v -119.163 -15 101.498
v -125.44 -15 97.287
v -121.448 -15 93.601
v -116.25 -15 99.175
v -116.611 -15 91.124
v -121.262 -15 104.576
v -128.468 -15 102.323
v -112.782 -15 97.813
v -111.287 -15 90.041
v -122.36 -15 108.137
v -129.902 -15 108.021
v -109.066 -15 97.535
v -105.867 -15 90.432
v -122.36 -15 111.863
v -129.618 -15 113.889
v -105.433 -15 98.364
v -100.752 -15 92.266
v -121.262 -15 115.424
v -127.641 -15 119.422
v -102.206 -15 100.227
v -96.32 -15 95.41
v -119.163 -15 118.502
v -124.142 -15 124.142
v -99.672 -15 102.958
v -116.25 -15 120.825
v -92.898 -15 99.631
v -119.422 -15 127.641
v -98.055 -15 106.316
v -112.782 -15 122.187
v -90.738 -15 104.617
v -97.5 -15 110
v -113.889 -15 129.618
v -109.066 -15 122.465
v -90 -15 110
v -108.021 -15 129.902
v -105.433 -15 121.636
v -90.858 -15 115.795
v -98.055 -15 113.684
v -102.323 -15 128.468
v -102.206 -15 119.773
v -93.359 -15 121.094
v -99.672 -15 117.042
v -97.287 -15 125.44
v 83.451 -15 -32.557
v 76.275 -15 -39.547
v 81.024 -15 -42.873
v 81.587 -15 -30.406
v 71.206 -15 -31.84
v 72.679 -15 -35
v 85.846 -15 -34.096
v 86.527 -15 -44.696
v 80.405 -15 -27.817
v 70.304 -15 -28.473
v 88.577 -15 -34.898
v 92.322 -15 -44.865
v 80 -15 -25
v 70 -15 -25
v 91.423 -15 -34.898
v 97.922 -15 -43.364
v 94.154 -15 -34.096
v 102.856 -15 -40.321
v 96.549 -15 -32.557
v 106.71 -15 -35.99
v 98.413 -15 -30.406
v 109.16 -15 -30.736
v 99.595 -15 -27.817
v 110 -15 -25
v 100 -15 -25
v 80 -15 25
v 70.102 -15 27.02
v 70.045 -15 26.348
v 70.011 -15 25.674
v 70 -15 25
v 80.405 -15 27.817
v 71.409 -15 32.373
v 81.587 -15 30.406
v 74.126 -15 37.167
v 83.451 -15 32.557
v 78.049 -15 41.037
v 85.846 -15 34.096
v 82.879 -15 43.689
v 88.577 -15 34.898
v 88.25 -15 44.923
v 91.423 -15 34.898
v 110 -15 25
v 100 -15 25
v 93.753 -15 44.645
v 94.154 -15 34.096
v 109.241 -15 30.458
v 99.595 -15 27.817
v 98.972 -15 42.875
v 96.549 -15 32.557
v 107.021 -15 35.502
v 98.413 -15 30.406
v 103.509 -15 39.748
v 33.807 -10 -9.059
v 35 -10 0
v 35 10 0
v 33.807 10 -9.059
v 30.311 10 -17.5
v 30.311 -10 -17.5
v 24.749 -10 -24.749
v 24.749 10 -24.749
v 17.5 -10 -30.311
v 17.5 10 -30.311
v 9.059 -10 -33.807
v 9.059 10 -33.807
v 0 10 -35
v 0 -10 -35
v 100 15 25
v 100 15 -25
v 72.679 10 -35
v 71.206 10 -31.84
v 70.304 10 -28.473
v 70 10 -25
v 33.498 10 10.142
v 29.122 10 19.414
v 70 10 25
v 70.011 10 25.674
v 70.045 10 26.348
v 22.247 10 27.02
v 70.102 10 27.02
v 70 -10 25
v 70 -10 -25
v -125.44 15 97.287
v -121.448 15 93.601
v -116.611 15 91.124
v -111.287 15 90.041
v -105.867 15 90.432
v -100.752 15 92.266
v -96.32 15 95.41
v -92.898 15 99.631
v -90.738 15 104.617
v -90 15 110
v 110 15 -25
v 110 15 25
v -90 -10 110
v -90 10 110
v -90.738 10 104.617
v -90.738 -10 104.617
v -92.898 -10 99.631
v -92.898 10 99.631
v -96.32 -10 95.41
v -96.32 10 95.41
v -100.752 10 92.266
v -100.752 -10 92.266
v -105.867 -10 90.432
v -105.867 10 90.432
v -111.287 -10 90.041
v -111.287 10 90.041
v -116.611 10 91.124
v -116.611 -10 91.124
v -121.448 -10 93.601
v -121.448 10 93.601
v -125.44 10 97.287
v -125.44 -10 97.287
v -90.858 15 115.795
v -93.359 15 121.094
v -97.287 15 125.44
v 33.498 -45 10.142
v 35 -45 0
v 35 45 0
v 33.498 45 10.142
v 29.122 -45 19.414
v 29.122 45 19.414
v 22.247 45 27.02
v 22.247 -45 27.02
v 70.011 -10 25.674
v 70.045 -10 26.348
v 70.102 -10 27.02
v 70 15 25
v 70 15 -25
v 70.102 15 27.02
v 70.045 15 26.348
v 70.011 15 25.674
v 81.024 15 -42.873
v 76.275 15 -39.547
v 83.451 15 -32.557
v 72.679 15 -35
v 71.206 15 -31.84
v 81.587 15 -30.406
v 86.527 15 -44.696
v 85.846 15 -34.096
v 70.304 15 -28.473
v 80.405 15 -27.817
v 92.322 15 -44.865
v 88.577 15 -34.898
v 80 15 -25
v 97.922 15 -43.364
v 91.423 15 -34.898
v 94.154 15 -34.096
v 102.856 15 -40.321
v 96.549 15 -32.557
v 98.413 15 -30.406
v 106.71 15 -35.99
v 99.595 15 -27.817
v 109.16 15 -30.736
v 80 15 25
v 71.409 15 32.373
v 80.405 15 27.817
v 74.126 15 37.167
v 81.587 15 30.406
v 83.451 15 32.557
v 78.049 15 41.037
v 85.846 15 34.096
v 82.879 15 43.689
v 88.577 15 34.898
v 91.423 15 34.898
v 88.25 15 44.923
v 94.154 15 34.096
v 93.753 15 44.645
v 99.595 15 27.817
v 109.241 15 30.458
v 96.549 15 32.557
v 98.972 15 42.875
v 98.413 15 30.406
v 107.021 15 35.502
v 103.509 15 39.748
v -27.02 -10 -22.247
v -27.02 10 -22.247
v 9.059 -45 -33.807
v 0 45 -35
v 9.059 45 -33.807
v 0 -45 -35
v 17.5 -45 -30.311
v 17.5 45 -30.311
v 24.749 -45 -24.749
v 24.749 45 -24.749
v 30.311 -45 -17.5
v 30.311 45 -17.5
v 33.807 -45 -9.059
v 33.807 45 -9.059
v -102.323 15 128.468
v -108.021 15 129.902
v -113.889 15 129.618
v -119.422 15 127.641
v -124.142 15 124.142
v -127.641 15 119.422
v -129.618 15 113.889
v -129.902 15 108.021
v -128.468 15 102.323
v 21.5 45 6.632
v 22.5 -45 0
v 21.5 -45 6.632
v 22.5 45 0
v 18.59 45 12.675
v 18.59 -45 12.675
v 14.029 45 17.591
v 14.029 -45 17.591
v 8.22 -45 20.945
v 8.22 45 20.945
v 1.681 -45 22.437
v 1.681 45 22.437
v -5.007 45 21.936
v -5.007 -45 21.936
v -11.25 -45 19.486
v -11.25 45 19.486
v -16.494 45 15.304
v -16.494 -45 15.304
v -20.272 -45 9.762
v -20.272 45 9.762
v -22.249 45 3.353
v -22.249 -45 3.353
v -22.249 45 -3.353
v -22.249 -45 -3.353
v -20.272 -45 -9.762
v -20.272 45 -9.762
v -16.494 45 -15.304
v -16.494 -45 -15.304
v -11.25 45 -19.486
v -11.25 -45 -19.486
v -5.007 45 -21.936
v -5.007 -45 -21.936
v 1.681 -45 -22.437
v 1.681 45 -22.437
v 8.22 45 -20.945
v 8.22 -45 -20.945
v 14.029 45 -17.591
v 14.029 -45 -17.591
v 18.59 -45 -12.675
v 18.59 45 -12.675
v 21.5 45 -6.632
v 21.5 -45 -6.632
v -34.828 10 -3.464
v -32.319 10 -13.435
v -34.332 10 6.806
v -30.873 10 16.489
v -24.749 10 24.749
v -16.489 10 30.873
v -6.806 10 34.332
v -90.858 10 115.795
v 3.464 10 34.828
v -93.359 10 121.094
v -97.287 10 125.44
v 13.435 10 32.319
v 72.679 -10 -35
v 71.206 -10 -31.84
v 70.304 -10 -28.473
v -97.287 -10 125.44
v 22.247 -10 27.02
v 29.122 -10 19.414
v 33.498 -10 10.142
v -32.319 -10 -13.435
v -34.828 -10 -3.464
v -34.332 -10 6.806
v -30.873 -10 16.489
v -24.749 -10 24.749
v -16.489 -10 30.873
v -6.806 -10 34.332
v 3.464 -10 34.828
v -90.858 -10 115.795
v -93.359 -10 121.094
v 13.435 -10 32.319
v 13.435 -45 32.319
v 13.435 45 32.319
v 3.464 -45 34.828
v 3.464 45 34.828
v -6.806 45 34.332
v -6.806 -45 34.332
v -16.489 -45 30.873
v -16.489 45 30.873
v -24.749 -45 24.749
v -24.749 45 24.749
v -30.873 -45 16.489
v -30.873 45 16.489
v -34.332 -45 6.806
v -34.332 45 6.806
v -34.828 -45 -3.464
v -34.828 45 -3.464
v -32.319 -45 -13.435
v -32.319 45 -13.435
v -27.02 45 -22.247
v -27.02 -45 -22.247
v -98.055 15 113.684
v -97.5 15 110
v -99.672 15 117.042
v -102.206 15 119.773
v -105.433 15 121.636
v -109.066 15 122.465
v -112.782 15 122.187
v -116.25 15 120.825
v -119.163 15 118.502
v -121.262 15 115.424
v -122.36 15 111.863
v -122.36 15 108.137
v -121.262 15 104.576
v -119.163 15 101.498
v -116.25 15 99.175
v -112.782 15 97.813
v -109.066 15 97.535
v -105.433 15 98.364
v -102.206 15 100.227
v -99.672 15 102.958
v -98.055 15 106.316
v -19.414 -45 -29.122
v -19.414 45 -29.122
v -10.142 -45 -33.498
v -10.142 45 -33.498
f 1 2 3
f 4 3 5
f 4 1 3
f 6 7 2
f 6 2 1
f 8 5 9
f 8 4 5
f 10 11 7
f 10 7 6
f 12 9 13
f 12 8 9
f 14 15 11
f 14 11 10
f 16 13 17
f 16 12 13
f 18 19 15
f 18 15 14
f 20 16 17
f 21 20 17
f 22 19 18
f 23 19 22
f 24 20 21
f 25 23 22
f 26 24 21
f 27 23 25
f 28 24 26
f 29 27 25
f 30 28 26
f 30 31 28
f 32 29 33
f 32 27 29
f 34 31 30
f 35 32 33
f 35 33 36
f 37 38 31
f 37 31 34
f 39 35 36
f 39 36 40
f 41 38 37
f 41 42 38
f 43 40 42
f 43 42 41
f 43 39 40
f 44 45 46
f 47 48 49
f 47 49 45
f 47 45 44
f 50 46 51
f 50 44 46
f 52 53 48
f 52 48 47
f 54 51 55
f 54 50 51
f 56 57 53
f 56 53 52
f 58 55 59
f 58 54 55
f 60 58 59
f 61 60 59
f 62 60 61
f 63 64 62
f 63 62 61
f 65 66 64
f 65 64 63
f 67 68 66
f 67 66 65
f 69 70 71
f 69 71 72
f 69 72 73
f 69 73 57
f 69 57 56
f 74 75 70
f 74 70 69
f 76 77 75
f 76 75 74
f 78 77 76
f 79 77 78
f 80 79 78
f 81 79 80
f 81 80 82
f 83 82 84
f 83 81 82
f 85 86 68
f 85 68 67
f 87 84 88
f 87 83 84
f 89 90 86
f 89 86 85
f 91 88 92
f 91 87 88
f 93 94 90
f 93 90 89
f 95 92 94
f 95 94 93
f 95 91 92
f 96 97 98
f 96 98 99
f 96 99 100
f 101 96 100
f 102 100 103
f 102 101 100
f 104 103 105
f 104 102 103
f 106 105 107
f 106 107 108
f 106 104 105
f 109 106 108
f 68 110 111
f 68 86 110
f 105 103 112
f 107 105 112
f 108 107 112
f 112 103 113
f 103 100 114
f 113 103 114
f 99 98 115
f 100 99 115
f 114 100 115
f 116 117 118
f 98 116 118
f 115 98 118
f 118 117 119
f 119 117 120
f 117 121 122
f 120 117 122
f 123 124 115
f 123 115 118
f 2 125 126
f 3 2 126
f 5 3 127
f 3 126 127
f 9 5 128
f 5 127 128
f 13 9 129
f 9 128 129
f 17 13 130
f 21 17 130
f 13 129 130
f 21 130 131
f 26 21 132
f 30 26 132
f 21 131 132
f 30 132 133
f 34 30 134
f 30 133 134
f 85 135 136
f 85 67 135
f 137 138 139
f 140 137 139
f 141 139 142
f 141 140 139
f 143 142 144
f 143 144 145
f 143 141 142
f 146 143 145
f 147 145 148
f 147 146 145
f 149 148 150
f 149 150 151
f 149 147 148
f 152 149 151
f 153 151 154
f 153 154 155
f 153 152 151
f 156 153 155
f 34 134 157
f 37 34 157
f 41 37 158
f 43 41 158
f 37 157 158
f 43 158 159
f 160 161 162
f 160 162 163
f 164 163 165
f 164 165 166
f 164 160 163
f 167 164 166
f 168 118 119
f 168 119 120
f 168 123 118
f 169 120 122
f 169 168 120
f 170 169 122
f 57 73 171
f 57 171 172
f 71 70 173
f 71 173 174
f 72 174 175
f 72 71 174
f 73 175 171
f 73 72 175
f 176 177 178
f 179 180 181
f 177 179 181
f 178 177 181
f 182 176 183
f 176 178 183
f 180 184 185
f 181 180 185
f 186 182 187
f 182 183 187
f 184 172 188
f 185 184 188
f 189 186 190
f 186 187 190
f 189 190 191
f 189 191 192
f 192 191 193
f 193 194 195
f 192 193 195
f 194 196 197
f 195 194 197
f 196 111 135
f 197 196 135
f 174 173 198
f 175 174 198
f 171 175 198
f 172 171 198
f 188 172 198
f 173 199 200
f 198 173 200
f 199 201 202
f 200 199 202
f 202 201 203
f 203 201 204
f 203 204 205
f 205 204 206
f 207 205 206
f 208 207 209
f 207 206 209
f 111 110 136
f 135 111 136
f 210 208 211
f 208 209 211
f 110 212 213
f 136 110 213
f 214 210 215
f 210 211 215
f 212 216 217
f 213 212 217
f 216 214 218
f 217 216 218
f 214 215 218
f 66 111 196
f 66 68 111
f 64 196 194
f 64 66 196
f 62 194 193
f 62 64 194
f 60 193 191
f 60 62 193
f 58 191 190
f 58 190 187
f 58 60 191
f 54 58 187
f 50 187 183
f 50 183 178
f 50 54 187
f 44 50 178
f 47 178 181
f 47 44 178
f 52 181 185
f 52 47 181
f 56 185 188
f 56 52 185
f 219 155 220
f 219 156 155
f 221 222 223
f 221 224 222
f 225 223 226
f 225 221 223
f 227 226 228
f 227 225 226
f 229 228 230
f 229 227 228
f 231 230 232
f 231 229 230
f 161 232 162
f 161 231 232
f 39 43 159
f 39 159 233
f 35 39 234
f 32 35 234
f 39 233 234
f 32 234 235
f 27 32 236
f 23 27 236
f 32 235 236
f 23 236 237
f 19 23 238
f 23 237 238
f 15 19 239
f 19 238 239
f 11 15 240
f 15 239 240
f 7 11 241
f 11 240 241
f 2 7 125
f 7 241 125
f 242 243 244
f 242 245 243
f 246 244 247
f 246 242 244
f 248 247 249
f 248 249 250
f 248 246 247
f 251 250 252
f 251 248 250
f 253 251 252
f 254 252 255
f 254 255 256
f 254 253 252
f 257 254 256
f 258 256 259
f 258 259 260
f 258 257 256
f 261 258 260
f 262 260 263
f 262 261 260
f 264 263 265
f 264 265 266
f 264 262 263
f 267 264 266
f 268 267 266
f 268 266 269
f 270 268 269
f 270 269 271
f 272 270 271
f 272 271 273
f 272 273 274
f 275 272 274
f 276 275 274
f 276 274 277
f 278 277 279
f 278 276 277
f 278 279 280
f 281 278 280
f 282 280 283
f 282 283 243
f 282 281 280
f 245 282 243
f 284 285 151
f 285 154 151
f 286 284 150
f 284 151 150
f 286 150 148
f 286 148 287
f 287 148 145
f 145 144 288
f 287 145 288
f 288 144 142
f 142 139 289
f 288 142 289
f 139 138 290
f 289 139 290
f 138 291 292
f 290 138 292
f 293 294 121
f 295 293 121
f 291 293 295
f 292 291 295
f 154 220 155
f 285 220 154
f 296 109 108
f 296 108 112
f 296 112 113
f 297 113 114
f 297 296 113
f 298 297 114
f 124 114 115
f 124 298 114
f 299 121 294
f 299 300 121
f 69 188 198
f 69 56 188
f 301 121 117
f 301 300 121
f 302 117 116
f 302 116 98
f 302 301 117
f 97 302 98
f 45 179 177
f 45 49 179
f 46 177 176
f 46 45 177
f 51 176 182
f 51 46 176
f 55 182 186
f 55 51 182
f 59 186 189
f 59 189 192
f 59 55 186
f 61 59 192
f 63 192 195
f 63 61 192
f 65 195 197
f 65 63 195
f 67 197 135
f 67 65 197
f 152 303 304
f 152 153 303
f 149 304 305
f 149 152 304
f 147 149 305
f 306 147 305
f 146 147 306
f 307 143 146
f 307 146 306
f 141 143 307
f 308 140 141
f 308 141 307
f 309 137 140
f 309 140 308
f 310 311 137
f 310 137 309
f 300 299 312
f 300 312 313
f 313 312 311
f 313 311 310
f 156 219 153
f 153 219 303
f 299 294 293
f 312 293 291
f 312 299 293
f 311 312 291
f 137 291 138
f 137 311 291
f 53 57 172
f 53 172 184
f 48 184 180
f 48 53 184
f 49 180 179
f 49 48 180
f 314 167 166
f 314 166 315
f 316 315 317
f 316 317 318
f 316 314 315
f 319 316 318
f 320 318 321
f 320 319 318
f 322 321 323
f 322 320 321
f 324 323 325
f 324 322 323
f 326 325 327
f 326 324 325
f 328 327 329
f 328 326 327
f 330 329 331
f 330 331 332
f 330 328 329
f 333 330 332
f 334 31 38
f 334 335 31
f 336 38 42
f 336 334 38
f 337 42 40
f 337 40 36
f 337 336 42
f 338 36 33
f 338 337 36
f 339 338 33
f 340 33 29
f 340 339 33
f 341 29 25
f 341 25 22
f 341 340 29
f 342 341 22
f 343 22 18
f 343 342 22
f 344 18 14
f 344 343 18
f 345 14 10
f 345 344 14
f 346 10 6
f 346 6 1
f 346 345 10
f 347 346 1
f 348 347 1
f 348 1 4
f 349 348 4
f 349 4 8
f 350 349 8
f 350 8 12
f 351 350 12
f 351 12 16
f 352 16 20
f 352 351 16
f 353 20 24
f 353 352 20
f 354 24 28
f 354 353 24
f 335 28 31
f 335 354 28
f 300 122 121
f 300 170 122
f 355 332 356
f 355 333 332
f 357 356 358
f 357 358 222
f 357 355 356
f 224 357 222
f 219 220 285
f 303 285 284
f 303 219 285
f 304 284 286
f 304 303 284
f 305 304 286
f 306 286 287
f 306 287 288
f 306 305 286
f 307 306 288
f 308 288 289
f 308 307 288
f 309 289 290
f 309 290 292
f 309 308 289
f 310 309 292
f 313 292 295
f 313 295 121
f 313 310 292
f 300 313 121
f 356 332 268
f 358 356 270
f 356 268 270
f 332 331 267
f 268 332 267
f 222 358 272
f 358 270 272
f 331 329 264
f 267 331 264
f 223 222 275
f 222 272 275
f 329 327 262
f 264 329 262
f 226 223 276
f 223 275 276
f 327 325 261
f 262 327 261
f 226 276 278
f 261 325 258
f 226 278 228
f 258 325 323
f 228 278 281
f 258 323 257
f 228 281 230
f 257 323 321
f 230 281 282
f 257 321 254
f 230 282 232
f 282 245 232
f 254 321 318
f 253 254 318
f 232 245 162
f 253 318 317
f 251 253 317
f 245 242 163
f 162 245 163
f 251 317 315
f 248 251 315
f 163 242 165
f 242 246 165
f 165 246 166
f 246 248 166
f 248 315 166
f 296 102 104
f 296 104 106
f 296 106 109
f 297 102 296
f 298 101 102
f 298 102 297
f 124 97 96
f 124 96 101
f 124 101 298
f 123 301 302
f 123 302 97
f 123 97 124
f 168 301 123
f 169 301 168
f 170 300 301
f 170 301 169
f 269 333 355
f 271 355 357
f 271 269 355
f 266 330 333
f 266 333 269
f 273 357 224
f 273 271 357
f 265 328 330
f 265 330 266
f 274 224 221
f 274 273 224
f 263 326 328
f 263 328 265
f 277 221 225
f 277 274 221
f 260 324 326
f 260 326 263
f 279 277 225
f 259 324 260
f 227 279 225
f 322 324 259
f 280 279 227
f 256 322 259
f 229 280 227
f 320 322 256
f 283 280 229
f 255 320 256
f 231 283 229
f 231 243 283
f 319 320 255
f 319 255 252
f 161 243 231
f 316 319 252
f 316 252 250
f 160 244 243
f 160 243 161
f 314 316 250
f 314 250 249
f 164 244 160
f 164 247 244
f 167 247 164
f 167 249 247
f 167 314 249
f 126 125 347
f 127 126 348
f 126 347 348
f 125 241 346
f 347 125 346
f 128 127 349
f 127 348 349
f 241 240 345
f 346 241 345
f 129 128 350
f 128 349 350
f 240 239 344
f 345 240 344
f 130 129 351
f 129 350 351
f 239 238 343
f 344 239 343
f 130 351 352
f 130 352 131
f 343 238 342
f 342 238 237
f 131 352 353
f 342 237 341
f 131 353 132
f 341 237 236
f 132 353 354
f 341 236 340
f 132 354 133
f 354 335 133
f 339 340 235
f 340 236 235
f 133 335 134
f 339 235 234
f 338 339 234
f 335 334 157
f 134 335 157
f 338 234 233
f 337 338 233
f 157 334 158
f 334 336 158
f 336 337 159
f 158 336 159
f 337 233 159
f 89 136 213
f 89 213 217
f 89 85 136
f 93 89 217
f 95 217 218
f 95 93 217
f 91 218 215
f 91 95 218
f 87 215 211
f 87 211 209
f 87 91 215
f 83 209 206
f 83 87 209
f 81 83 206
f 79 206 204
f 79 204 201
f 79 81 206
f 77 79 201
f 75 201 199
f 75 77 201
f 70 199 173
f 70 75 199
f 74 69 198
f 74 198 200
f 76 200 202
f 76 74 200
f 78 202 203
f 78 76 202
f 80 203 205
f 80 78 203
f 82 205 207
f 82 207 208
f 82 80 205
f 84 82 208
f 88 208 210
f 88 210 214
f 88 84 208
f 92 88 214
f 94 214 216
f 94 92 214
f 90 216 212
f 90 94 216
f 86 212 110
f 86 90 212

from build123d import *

# Parameters (mm, degrees)
F0_R     = 12.5
F1_DEPTH = 15
F0_R_2   = 22.5
F2_DEPTH = 45
F3_DEPTH = 10


with BuildPart() as f1:
    # F0 (on Front) → F1 (new body, symmetric)
    with BuildSketch(Plane.XZ):
        with BuildLine():
            ThreePointArc((-90, 110), (-91.913374, 118.536626), (-97.287398, 125.439875))
            ThreePointArc((-97.287398, 125.439875), (-124.142136, 124.142136), (-125.439875, 97.287398))
            ThreePointArc((-125.439875, 97.287398), (-103.24713, 91.174519), (-90, 110))
        make_face()
        with Locations((-110, 110)):
            Circle(F0_R, mode=Mode.SUBTRACT)
        with BuildLine():
            ThreePointArc((110, 25), (91.011184, 44.974421), (70.102249, 27.019781))
            ThreePointArc((70.102249, 27.019781), (70.025579, 26.011184), (70, 25))
            Line((70, 25), (70, -25))
            ThreePointArc((70, -25), (70.681483, -30.176381), (72.679492, -35))
            ThreePointArc((72.679492, -35), (95.176381, -44.318517), (110, -25))
            Line((110, -25), (110, 25))
        make_face()
        with BuildLine():
            ThreePointArc((80, 25), (90, 35), (100, 25))
            Line((100, 25), (100, -25))
            ThreePointArc((100, -25), (90, -35), (80, -25))
            Line((80, -25), (80, 25))
        make_face(mode=Mode.SUBTRACT)
    extrude(amount=F1_DEPTH, both=True)


with BuildPart() as f2:
    # F0 (on Front) → F2 (new body, symmetric)
    with BuildSketch(Plane.XZ):
        with BuildLine():
            ThreePointArc((0, -35), (24.748737, -24.748737), (35, 0))
            ThreePointArc((35, 0), (31.651595, 14.939095), (22.247054, 27.019781))
            ThreePointArc((22.247054, 27.019781), (-24.748737, 24.748737), (-27.019781, -22.247054))
            ThreePointArc((-27.019781, -22.247054), (-14.939095, -31.651595), (0, -35))
        make_face()
        Circle(F0_R_2, mode=Mode.SUBTRACT)
    extrude(amount=F2_DEPTH, both=True)


with BuildPart() as f3:
    # F0 (on Front) → F3 (new body, symmetric)
    with BuildSketch(Plane.XZ):
        with BuildLine():
            ThreePointArc((-27.019781, -22.247054), (-24.748737, 24.748737), (22.247054, 27.019781))
            Line((22.247054, 27.019781), (-97.287398, 125.439875))
            ThreePointArc((-97.287398, 125.439875), (-91.913374, 118.536626), (-90, 110))
            ThreePointArc((-90, 110), (-103.24713, 91.174519), (-125.439875, 97.287398))
            Line((-125.439875, 97.287398), (-27.019781, -22.247054))
        make_face()
        with BuildLine():
            ThreePointArc((22.247054, 27.019781), (31.651595, 14.939095), (35, 0))
            ThreePointArc((35, 0), (24.748737, -24.748737), (0, -35))
            Line((0, -35), (72.679492, -35))
            ThreePointArc((72.679492, -35), (70.681483, -30.176381), (70, -25))
            Line((70, -25), (70, 25))
            ThreePointArc((70, 25), (70.025579, 26.011184), (70.102249, 27.019781))
            Line((70.102249, 27.019781), (22.247054, 27.019781))
        make_face()
    extrude(amount=F3_DEPTH, both=True)


solid = Compound([f1.part, f2.part, f3.part])
